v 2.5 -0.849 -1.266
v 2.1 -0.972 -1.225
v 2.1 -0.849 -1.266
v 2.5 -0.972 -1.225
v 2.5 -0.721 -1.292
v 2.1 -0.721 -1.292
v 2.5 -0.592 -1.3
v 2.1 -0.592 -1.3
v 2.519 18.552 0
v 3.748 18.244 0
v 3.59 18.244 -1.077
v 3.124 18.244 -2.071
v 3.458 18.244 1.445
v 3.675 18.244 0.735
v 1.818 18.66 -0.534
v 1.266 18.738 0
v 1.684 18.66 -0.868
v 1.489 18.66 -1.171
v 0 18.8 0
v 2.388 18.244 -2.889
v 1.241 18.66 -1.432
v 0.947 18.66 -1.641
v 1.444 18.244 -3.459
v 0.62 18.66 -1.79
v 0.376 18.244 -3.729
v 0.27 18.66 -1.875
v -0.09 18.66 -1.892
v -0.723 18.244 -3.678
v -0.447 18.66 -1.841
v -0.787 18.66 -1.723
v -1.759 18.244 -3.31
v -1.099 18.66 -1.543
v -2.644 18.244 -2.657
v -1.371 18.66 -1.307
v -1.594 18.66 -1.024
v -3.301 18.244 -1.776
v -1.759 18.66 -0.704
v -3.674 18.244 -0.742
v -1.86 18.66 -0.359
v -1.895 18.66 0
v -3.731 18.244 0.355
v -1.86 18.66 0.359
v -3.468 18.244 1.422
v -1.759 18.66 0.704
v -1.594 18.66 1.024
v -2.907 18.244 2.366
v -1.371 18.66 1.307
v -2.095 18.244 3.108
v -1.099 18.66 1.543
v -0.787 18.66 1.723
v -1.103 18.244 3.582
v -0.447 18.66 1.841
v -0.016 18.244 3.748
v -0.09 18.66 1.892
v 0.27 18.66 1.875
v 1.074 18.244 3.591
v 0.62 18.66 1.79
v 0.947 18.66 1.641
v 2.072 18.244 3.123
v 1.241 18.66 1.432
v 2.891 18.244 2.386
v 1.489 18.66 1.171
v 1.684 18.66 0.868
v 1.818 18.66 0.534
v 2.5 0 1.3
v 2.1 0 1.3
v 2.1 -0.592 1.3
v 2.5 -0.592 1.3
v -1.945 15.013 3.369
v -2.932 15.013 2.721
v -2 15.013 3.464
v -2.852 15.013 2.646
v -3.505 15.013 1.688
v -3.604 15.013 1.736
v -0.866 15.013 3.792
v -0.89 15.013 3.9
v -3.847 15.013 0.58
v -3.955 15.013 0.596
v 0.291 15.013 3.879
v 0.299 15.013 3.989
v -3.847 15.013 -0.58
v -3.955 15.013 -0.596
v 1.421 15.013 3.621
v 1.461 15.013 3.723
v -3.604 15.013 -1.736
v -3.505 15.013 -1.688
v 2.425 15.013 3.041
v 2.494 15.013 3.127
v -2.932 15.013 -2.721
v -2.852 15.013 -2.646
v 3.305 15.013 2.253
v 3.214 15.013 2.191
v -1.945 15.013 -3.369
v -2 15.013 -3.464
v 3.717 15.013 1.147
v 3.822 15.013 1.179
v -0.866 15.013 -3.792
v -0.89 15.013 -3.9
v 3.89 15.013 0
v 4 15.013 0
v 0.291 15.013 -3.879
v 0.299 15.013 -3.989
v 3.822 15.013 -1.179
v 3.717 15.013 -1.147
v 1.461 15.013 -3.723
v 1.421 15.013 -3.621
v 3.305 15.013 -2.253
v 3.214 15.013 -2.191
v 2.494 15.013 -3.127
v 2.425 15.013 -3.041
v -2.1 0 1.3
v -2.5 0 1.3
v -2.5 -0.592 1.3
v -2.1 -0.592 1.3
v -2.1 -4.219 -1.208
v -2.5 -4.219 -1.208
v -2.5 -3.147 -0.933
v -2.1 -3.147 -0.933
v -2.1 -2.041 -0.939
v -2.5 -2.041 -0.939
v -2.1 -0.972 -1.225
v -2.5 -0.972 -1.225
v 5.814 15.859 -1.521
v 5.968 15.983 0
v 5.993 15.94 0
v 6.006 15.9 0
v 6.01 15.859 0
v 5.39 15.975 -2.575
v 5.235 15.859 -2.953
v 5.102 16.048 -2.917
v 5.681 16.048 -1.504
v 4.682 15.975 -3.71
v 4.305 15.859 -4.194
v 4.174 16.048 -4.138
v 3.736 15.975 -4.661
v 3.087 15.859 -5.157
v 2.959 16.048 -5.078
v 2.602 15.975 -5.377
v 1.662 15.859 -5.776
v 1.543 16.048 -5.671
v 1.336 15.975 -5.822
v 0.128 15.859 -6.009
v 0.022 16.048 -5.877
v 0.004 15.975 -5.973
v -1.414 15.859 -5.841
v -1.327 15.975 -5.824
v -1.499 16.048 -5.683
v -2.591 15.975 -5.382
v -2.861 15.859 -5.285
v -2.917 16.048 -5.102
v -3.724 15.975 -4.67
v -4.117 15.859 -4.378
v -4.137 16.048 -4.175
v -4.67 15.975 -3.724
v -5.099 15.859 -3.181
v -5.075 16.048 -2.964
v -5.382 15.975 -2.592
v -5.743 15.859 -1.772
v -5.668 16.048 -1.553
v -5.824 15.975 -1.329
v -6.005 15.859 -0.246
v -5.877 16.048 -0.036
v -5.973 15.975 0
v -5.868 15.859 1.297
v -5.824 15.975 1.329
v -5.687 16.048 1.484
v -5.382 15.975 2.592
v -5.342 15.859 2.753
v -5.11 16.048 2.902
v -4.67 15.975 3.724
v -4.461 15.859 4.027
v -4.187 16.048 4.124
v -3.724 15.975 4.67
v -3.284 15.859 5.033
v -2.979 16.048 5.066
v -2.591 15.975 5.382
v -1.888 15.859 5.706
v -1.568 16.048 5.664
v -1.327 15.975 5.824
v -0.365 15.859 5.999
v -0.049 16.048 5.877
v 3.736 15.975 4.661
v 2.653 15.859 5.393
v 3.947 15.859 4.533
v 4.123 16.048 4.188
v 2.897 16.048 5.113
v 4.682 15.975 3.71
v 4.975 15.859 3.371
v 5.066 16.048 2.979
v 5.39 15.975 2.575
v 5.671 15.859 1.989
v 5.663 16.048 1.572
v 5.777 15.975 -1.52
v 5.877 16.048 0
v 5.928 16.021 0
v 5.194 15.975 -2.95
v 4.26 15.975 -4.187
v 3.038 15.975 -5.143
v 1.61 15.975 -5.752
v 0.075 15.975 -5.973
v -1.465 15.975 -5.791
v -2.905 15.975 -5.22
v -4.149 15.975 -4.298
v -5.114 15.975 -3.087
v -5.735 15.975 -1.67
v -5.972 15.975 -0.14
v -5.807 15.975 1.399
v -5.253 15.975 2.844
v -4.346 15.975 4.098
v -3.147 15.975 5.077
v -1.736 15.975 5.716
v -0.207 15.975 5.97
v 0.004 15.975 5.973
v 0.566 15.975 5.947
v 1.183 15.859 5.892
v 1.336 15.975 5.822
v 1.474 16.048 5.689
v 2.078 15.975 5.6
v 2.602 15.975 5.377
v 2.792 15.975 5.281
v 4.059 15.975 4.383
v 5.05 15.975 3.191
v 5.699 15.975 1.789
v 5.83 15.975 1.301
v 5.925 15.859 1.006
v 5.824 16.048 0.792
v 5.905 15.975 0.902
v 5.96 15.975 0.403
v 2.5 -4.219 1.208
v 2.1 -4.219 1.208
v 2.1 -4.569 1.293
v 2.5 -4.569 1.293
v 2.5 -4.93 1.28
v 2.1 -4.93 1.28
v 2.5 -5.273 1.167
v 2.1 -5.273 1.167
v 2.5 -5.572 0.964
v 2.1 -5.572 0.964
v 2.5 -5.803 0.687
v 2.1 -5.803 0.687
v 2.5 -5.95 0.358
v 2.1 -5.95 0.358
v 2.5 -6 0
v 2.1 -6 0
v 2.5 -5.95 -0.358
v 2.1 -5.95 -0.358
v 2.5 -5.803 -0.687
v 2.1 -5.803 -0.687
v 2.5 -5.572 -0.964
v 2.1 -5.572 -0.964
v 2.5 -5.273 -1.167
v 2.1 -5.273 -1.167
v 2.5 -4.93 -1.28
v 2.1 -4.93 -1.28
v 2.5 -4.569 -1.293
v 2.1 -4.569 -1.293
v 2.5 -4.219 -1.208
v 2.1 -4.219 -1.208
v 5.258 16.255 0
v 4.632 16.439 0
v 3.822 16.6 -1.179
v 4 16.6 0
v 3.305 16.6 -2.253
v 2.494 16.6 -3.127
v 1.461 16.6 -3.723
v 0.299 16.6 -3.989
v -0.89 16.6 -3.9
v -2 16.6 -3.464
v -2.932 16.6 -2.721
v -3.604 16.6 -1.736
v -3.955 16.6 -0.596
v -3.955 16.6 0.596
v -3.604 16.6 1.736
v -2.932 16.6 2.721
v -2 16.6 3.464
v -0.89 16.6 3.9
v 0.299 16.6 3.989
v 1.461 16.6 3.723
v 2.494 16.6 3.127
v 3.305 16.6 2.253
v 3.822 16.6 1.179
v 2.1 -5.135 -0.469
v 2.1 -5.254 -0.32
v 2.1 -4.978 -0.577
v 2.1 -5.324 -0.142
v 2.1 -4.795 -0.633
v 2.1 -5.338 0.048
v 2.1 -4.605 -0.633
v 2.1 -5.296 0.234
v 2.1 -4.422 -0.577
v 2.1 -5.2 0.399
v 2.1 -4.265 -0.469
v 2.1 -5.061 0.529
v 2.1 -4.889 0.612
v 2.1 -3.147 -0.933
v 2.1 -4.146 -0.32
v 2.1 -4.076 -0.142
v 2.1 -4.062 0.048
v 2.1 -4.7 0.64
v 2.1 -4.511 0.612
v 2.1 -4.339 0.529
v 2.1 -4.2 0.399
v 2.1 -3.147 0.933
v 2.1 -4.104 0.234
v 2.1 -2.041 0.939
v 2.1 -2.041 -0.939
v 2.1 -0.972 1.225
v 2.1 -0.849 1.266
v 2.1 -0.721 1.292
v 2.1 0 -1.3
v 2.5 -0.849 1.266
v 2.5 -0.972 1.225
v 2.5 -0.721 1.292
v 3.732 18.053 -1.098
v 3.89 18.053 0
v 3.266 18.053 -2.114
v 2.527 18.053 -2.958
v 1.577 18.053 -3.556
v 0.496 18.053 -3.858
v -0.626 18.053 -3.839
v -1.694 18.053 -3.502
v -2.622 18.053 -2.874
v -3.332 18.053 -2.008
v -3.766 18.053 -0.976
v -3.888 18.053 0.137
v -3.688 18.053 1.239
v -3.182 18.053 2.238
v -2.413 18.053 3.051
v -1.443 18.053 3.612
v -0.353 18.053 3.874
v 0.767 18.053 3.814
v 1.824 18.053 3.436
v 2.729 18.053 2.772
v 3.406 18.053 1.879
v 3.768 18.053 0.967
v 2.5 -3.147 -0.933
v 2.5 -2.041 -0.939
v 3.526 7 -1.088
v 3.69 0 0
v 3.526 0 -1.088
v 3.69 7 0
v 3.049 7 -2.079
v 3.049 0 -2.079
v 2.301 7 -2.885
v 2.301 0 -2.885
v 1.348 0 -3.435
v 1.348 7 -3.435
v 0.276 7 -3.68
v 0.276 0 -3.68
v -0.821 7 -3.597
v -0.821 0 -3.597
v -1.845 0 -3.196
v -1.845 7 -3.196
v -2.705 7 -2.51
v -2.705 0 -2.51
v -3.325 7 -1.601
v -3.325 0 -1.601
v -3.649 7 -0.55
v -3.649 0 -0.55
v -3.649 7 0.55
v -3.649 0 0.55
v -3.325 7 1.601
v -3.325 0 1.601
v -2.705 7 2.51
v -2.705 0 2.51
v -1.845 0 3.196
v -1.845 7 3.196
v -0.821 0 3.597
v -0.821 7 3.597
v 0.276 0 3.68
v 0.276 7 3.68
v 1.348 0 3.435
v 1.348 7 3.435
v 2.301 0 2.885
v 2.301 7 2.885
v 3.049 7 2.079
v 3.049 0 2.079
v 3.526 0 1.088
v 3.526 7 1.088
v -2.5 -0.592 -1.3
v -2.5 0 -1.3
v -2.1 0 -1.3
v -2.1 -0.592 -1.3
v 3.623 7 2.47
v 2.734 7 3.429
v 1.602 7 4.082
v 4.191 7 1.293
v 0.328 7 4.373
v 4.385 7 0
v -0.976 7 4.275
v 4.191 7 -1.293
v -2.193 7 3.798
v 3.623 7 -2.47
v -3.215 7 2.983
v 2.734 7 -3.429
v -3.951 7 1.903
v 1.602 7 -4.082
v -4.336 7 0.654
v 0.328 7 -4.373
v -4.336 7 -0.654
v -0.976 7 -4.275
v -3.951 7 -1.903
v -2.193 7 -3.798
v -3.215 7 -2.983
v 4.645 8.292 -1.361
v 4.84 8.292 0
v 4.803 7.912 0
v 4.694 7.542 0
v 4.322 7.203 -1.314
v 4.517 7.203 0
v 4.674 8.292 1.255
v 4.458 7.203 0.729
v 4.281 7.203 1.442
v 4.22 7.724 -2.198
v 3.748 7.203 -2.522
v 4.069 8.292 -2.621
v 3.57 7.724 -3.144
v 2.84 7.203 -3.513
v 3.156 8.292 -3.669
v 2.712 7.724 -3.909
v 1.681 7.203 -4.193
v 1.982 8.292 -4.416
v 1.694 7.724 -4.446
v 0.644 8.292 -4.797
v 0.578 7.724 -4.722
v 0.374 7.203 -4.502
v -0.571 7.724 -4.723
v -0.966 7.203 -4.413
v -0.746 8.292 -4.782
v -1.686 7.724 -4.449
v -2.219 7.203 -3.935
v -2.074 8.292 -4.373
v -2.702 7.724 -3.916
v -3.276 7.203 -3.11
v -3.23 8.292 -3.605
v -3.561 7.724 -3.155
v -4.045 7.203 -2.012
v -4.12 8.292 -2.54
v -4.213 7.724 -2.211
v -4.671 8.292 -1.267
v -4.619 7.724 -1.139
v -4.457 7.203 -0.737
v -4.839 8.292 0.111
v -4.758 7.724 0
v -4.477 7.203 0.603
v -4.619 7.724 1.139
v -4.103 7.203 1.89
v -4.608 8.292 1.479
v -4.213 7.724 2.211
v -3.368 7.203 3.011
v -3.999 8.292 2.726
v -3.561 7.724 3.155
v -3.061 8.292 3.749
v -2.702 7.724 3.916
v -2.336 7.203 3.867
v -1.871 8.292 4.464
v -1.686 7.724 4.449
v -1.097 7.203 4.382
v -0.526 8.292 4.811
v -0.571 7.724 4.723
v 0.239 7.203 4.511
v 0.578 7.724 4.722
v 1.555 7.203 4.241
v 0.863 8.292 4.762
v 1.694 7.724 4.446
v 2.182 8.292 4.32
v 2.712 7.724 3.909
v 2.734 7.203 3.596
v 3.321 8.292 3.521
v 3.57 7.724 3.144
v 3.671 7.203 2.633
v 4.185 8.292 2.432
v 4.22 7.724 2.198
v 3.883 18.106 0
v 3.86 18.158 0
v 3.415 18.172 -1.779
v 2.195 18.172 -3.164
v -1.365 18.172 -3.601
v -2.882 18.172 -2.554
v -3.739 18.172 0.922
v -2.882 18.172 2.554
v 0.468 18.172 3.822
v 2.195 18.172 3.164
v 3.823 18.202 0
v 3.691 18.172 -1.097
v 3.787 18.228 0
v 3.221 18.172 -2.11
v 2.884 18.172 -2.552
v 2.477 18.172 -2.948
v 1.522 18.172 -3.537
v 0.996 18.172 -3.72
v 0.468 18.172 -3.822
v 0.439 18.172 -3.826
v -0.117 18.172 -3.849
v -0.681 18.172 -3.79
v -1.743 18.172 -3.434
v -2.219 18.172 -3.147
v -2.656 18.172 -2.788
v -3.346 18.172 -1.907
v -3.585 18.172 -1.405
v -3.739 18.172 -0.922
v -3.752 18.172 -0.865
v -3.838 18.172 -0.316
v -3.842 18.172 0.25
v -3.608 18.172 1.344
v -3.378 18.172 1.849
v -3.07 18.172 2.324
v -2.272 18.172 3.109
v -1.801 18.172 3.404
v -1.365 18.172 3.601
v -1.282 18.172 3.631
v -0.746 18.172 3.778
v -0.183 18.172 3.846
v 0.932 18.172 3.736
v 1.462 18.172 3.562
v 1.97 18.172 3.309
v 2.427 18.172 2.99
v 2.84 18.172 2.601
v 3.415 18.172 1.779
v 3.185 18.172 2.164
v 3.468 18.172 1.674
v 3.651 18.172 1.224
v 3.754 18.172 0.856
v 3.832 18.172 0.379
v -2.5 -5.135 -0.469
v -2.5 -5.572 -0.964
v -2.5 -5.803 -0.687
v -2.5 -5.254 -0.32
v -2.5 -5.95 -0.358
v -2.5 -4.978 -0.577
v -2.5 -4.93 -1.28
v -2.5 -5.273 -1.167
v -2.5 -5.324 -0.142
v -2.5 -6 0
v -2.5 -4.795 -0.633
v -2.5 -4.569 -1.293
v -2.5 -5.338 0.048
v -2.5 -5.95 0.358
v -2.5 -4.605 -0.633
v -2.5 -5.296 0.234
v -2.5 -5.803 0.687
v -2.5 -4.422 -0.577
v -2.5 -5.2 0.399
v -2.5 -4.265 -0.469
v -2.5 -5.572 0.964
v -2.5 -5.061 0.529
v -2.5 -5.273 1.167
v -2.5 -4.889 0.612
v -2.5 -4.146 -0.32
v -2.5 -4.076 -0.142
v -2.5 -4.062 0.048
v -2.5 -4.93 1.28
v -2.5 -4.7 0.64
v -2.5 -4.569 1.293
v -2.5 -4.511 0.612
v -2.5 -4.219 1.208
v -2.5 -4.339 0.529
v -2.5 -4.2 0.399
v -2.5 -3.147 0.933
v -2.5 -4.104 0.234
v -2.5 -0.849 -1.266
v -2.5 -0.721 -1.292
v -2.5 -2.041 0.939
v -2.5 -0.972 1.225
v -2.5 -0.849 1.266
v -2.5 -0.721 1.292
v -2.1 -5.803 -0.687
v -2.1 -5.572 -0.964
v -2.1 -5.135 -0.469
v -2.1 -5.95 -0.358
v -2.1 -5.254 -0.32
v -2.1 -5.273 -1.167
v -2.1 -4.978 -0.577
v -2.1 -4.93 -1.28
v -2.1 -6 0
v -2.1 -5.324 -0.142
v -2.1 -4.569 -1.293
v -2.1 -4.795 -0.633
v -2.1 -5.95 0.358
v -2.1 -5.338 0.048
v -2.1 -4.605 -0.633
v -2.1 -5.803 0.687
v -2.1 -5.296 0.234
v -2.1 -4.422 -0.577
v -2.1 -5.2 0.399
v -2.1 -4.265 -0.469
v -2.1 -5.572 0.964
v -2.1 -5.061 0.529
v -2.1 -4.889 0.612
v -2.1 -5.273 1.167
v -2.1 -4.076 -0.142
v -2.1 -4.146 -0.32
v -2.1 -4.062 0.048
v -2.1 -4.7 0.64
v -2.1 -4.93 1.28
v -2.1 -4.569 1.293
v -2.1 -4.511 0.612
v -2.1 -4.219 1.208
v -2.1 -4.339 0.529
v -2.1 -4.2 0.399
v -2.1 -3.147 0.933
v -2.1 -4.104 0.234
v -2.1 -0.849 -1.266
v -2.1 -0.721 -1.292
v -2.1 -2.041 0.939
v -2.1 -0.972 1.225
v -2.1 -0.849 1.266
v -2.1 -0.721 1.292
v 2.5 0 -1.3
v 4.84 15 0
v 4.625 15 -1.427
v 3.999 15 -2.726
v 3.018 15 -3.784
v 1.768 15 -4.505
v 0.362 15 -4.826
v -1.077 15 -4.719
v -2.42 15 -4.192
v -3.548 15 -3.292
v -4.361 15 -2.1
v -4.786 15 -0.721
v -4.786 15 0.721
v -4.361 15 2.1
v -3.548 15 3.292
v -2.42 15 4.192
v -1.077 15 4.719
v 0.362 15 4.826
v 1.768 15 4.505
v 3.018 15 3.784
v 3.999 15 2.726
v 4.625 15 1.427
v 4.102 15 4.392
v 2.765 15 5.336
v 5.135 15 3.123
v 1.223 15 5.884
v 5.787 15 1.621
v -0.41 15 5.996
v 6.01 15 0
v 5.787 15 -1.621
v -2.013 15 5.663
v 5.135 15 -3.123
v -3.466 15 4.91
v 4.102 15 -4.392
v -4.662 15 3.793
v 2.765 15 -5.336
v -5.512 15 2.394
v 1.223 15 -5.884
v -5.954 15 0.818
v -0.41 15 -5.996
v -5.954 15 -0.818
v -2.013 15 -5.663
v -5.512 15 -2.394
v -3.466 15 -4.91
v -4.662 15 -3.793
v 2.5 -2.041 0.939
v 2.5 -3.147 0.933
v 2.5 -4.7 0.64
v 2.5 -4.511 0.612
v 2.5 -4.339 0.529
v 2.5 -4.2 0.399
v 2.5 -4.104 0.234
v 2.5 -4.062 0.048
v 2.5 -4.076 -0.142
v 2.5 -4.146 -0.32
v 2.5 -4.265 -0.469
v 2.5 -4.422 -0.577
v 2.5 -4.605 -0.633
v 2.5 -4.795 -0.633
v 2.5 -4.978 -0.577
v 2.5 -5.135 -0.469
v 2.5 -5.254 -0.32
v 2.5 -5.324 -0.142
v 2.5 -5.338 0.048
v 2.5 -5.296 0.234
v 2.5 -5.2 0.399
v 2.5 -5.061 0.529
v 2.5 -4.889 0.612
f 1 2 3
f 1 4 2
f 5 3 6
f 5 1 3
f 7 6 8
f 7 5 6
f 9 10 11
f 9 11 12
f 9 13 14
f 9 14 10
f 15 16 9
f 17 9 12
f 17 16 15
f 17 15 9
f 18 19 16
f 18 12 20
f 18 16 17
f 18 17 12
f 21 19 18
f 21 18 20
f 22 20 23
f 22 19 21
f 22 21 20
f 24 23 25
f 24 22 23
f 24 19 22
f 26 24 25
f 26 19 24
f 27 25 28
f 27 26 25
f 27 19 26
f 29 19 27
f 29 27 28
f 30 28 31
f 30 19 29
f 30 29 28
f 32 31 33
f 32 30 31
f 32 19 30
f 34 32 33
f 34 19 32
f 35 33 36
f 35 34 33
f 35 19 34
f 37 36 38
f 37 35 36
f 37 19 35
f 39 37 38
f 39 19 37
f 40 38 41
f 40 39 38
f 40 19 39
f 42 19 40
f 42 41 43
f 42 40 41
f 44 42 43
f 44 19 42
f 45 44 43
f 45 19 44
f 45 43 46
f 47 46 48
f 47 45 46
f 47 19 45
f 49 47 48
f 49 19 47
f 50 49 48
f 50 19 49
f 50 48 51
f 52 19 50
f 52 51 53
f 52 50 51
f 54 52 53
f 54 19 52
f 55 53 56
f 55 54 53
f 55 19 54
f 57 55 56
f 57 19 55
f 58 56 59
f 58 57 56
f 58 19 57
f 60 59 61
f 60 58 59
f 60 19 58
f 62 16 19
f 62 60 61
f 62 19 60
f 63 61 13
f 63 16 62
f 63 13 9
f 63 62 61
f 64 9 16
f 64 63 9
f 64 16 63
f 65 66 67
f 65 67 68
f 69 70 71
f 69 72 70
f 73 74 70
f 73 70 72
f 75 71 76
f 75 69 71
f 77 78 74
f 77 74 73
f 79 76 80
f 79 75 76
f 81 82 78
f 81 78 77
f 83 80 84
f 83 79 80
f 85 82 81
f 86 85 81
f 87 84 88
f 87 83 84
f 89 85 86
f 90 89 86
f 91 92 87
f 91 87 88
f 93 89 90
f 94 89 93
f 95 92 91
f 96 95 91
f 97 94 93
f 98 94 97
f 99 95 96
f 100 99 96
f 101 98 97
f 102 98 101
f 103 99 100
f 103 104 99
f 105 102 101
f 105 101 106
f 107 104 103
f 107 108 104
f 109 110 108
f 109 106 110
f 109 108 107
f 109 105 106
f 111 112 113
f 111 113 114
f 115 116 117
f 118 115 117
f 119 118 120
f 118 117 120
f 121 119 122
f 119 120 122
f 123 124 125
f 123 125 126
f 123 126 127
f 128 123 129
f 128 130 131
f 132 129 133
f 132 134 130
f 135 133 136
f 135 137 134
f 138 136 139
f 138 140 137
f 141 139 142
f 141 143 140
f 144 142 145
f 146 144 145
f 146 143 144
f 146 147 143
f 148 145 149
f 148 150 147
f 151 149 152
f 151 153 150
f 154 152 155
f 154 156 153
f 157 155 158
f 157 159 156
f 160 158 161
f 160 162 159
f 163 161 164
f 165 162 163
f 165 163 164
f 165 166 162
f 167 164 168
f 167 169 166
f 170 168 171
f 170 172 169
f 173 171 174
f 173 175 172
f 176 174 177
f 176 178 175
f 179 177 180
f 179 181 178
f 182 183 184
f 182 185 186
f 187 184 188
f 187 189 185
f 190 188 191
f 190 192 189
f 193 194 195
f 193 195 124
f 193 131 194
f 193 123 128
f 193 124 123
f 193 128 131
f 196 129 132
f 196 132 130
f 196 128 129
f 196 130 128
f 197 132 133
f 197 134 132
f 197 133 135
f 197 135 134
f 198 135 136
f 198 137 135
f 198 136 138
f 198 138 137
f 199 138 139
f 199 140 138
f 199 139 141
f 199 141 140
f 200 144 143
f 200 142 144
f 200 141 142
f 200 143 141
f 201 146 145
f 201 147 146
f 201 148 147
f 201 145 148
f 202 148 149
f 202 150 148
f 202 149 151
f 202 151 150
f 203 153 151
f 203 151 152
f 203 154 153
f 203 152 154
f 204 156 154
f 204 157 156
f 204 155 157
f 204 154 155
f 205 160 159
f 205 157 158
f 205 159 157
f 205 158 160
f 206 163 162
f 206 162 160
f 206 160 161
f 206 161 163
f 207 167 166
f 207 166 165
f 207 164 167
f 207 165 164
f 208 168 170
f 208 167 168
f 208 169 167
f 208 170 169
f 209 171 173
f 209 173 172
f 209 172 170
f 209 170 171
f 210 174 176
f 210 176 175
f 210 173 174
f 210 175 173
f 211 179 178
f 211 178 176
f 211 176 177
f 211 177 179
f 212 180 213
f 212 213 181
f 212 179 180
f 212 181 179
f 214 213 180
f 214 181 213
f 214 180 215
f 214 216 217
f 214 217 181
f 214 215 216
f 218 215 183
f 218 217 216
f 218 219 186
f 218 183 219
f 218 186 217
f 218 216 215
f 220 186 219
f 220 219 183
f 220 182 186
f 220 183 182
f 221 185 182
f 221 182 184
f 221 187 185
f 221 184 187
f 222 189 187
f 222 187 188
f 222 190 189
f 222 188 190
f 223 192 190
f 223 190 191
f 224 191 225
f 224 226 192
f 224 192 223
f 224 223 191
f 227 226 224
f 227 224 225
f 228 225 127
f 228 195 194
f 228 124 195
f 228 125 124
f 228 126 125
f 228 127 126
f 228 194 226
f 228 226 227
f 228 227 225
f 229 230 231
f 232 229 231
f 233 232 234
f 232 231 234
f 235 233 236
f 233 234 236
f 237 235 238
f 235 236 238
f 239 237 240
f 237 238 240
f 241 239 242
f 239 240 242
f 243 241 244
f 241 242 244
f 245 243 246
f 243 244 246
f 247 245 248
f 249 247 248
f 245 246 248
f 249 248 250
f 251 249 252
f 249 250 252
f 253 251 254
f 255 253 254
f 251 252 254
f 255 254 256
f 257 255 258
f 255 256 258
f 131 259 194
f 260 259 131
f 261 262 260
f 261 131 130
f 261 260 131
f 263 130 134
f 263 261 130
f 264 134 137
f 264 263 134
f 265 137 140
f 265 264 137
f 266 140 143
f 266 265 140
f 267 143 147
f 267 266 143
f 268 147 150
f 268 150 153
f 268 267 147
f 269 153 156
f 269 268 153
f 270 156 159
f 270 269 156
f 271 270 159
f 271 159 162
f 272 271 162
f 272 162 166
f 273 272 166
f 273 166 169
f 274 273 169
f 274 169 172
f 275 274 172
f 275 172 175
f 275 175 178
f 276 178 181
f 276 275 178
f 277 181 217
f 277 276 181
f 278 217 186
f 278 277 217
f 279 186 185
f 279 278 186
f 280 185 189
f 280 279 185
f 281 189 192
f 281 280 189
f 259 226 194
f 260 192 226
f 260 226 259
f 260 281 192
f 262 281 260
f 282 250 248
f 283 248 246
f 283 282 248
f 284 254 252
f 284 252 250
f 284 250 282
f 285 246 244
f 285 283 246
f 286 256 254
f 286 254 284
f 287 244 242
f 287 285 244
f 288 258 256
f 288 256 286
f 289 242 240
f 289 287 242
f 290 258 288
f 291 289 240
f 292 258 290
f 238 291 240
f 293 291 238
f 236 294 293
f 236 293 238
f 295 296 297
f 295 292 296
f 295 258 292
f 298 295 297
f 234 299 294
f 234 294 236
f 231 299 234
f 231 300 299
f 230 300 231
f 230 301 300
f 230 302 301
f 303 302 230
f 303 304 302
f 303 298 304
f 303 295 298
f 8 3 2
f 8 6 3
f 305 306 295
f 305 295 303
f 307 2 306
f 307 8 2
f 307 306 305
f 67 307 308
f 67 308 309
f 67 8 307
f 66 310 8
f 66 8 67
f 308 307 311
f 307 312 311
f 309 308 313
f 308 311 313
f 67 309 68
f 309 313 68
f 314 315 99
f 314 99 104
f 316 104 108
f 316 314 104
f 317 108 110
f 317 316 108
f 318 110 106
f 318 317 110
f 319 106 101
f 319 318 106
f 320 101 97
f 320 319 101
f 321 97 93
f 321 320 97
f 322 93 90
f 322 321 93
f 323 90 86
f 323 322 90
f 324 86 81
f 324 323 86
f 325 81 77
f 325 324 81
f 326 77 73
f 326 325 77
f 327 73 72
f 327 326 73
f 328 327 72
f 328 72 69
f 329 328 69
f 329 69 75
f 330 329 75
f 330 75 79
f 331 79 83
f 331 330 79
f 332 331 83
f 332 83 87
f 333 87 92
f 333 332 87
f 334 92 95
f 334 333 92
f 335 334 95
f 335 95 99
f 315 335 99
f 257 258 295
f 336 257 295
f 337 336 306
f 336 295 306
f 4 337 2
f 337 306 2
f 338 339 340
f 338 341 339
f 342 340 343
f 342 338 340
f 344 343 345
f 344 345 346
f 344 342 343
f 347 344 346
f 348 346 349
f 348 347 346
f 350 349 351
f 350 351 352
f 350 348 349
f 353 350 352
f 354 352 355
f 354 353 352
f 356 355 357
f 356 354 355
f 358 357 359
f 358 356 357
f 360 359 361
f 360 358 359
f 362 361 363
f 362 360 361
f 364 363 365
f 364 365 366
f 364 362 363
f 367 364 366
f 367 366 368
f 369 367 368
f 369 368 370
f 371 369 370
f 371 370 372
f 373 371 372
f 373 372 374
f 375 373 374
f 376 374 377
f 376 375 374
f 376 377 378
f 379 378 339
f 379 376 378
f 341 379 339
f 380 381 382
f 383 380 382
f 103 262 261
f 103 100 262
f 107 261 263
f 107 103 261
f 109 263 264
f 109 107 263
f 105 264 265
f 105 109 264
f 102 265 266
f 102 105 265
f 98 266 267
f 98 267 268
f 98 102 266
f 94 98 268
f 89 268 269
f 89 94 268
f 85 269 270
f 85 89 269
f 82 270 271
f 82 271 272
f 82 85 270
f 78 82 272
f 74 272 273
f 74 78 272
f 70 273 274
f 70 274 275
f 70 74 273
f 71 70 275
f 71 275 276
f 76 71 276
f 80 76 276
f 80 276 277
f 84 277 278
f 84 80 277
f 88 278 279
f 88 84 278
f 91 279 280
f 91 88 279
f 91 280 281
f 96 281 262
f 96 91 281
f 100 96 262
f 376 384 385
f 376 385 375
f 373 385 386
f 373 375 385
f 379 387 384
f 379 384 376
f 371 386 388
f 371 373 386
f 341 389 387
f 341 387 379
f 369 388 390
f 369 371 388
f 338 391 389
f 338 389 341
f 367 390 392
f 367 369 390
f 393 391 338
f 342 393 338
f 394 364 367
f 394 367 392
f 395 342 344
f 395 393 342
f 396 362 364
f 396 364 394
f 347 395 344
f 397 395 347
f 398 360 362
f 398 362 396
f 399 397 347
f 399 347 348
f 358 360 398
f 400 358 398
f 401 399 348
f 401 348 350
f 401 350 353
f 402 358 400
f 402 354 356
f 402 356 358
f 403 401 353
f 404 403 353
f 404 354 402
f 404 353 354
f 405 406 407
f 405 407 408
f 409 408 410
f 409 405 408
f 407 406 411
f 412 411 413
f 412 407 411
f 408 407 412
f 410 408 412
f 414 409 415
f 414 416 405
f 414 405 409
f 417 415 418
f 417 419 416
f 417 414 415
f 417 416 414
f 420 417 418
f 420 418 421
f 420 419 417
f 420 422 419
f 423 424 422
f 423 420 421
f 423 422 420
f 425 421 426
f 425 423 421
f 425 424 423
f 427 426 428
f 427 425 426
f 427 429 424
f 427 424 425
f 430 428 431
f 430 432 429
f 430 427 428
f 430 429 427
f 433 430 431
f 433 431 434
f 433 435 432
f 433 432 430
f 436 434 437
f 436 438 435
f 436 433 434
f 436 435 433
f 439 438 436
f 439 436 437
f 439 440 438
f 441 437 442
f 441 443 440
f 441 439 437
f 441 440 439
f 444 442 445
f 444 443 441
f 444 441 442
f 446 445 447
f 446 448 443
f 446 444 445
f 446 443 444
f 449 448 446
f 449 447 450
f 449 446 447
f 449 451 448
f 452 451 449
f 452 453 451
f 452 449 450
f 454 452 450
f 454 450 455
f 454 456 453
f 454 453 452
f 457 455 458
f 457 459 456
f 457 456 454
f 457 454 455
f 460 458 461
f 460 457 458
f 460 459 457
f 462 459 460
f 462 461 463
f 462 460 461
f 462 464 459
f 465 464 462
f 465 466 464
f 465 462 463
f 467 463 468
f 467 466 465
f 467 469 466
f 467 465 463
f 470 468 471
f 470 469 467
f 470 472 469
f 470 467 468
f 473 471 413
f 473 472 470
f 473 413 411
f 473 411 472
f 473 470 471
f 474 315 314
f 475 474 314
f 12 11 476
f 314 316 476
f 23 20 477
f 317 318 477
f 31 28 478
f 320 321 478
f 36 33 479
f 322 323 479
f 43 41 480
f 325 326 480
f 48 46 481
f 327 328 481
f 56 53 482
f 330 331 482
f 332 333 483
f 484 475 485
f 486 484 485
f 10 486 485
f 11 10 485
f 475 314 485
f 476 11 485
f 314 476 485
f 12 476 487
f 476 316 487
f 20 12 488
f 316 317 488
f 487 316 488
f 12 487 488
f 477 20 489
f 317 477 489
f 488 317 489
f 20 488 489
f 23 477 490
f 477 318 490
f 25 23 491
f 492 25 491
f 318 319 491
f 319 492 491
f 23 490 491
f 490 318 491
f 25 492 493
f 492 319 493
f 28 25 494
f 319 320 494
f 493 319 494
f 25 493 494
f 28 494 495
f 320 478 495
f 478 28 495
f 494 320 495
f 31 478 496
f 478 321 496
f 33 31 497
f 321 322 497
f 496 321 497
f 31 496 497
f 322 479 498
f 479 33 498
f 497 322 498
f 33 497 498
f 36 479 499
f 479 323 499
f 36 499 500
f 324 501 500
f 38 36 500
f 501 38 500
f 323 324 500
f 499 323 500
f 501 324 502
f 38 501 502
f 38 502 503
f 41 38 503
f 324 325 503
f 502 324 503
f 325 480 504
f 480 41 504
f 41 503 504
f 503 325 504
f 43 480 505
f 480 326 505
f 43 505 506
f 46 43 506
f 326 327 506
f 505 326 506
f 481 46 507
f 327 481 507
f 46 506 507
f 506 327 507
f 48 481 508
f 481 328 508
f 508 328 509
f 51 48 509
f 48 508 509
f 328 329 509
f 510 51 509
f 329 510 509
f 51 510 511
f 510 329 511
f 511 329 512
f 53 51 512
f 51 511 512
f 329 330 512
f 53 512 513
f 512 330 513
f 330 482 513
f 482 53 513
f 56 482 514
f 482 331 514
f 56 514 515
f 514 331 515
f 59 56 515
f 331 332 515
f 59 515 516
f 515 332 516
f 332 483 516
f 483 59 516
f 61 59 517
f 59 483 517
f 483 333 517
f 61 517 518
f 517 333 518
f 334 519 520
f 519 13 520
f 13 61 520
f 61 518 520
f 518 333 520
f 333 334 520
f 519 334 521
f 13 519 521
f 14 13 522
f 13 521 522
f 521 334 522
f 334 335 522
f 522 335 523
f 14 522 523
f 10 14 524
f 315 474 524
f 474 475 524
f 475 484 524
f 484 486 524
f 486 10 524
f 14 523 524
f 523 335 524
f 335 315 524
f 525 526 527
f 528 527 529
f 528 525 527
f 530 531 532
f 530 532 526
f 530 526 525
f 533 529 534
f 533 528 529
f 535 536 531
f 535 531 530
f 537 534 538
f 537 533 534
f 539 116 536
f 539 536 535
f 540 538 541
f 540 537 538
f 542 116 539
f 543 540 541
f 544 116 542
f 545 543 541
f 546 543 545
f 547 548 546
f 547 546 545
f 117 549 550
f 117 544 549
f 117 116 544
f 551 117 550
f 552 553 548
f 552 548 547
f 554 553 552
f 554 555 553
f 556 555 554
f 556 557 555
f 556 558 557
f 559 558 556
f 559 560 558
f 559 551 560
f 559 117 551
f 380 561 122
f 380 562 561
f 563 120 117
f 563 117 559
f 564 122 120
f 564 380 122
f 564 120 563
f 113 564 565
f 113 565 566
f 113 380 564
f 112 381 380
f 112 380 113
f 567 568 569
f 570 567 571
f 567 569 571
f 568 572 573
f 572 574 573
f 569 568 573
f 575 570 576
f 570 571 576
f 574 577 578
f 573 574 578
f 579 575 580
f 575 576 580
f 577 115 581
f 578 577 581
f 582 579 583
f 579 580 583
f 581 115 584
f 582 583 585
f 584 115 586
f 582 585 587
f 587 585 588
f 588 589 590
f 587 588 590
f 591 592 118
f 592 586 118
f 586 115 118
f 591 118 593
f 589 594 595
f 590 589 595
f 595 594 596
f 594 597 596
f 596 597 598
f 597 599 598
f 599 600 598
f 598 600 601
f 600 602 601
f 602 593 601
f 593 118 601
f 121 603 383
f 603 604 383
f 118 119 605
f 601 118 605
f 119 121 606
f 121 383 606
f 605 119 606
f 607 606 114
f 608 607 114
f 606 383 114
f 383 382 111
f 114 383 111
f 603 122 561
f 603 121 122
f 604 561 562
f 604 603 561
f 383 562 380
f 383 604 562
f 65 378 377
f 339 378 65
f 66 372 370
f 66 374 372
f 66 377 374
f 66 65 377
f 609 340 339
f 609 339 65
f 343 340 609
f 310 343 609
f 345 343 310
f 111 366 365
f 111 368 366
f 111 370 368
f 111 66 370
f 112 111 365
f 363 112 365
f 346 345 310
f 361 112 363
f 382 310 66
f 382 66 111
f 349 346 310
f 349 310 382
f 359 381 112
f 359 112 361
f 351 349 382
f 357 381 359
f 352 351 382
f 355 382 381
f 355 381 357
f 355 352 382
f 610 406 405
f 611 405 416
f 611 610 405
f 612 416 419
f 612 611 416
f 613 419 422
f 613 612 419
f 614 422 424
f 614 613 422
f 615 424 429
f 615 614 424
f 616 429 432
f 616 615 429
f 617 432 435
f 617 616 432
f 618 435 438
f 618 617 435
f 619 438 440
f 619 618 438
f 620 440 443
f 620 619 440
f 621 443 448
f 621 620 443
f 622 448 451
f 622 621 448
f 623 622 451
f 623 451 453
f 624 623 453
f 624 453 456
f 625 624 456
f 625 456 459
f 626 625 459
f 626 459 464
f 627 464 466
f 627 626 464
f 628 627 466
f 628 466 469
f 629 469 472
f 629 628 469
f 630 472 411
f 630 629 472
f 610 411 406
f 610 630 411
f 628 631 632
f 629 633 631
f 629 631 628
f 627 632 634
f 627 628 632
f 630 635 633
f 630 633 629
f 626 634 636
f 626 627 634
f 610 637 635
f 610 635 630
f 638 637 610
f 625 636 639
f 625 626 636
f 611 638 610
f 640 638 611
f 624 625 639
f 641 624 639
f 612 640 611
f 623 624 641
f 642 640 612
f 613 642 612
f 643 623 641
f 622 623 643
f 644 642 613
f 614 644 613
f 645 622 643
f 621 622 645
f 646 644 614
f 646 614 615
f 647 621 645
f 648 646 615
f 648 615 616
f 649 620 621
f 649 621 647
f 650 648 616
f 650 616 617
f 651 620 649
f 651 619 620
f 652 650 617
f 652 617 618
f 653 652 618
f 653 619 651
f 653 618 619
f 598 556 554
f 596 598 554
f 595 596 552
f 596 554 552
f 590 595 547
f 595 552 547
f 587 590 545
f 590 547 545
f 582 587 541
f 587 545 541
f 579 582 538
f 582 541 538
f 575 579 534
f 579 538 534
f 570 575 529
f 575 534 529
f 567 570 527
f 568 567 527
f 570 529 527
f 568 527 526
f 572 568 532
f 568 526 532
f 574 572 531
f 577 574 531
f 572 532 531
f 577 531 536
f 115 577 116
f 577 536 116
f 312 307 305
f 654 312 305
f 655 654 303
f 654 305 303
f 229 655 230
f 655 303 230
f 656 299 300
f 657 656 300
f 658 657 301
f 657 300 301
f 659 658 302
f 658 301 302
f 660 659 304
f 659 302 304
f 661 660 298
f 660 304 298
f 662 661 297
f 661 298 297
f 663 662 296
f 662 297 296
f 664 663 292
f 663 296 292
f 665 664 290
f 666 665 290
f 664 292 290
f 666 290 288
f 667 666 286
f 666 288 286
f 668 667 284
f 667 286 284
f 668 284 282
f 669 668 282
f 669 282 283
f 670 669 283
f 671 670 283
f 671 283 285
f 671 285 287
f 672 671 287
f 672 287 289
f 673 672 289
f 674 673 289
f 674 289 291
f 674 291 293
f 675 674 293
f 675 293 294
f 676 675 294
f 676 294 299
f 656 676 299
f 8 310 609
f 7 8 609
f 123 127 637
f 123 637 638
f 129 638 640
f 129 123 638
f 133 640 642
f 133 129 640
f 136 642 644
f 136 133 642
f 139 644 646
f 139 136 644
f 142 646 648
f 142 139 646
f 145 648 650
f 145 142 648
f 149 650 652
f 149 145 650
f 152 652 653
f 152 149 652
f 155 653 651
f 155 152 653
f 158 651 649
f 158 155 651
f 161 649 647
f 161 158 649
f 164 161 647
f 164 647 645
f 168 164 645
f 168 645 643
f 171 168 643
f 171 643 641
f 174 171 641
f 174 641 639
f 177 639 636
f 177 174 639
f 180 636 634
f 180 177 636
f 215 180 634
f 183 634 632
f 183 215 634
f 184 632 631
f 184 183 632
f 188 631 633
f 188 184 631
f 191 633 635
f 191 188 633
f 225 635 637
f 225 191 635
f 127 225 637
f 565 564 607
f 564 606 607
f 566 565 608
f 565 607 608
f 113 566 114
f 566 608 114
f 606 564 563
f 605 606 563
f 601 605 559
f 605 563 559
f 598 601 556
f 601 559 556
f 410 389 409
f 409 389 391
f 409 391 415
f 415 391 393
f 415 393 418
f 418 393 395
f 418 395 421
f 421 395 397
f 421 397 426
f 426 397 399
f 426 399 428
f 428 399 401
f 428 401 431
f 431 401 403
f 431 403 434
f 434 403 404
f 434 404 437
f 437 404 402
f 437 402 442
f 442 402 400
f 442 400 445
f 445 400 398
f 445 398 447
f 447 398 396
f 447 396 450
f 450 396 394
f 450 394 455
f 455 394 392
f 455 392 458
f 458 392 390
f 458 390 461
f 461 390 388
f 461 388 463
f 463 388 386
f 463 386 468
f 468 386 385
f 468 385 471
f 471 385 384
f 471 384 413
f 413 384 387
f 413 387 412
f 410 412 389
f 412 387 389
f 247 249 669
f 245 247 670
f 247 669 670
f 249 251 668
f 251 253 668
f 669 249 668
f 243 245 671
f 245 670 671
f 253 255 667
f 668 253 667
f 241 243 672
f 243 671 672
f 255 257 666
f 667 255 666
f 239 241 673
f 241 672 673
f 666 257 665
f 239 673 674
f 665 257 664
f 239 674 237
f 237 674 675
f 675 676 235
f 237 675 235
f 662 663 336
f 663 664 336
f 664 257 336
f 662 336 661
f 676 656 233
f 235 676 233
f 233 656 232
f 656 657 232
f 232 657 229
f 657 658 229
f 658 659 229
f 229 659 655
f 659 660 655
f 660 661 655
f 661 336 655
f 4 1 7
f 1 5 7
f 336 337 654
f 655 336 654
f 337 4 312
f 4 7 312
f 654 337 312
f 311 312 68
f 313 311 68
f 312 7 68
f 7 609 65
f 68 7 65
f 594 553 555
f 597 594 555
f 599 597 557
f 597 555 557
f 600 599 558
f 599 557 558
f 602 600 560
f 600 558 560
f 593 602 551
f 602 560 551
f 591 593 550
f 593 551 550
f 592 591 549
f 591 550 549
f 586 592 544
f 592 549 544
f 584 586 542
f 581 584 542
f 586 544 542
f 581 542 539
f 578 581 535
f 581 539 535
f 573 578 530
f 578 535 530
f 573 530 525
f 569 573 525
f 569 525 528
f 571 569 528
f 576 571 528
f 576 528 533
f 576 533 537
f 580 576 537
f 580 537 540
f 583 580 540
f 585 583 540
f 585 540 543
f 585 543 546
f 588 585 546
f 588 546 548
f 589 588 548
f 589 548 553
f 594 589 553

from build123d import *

# Parameters (mm, degrees)
CONG_1_R                = 0.2
CONG_2_R                = 0.2
CHANFREIN1_SIZE         = 0.7
CHANFREIN1_SIZE2        = 0.454585315
CONG_3_R                = 2
ESQUISSE2_W             = 0.4
ESQUISSE2_H             = 2.6
BOSS_EXTRU_1_DEPTH      = 6
ESQUISSE3_R             = 0.64
ENL_V_MAT_EXTRU_1_DEPTH = 6
CONG_4_R                = 1


with BuildPart() as part:
    # Esquisse1 → Révolution1 (revolve)
    with BuildSketch(Plane.XY):
        with BuildLine():
            Line((0, 18.8), (0, 0))
            Line((0, 0), (3.69, 0))
            Line((3.69, 0), (3.69, 7))
            Line((3.69, 7), (4.84, 7))
            Line((4.84, 7), (4.84, 15))
            Line((4.84, 15), (6.01, 15))
            Line((6.01, 15), (6.01, 16))
            ThreePointArc((6.01, 16), (5.013982948, 16.330092875), (4, 16.6))
            Line((4, 16.6), (4, 15.013190638))
            Line((4, 15.013190638), (3.89, 15.013190638))
            Line((3.89, 15.013190638), (3.89, 18.2))
            ThreePointArc((3.89, 18.2), (1.968000254, 18.649118314), (0, 18.8))
        make_face()
    revolve(axis=Axis((0, 0, 0), (0, 1, 0)))

    # Congé1
    cong_1_edges = [part.edges().sort_by_distance(p)[0] for p in [
        (-3.89, 18.2, 0),
    ]]
    fillet(cong_1_edges, radius=CONG_1_R)

    # Congé2
    cong_2_edges = [part.edges().sort_by_distance(p)[0] for p in [
        (-6.01, 16, 0),
    ]]
    fillet(cong_2_edges, radius=CONG_2_R)

    # Chanfrein1
    chanfrein1_edges = [part.edges().sort_by_distance(p)[0] for p in [
        (-4.84, 7, 0),
    ]]
    chanfrein1_side = [part.faces().sort_by_distance(p)[0] for p in [
        (-4.84, 11, 0),
    ]]
    chamfer(chanfrein1_edges, length=CHANFREIN1_SIZE, length2=CHANFREIN1_SIZE2, reference=chanfrein1_side[0])

    # Congé3
    cong_3_edges = [part.edges().sort_by_distance(p)[0] for p in [
        (-4.84, 7.7, 0),
    ]]
    fillet(cong_3_edges, radius=CONG_3_R)

    # Esquisse2 → Boss.-Extru.1 (add)
    with BuildSketch(Plane.XZ):
        with Locations((2.3, 0)):
            Rectangle(ESQUISSE2_W, ESQUISSE2_H)
        with Locations((-2.3, 0)):
            Rectangle(ESQUISSE2_W, ESQUISSE2_H)
    extrude(amount=BOSS_EXTRU_1_DEPTH)

    # Esquisse3 → Enlèv. mat.-Extru.1 (cut)
    with BuildSketch(Plane.ZY.offset(2.5)):
        with Locations((0, -4.7)):
            Circle(ESQUISSE3_R)
        with BuildLine():
            Line((-1.3, -0.8), (-4.192462756, -0.8))
            Line((-4.192462756, -0.8), (-4.192462756, -7.475627282))
            Line((-4.192462756, -7.475627282), (5.572809524, -7.57510374))
            Line((5.572809524, -7.57510374), (5.225347222, -0.8))
            Line((5.225347222, -0.8), (1.3, -0.8))
            ThreePointArc((1.3, -0.8), (0.901580438, -2.499750503), (1.207561262, -4.218548238))
            ThreePointArc((1.207561262, -4.218548238), (0, -6), (-1.207561262, -4.218548238))
            ThreePointArc((-1.207561262, -4.218548238), (-0.901580438, -2.499750503), (-1.3, -0.8))
        make_face()
    extrude(amount=-ENL_V_MAT_EXTRU_1_DEPTH, mode=Mode.SUBTRACT)

    # Congé4
    cong_4_edges = [part.edges().sort_by_distance(p)[0] for p in [
        (-2.3, -0.8, -1.3),
        (2.3, -0.8, -1.3),
        (2.3, -0.8, 1.3),
        (-2.3, -0.8, 1.3),
    ]]
    fillet(cong_4_edges, radius=CONG_4_R)


solid = part.part
